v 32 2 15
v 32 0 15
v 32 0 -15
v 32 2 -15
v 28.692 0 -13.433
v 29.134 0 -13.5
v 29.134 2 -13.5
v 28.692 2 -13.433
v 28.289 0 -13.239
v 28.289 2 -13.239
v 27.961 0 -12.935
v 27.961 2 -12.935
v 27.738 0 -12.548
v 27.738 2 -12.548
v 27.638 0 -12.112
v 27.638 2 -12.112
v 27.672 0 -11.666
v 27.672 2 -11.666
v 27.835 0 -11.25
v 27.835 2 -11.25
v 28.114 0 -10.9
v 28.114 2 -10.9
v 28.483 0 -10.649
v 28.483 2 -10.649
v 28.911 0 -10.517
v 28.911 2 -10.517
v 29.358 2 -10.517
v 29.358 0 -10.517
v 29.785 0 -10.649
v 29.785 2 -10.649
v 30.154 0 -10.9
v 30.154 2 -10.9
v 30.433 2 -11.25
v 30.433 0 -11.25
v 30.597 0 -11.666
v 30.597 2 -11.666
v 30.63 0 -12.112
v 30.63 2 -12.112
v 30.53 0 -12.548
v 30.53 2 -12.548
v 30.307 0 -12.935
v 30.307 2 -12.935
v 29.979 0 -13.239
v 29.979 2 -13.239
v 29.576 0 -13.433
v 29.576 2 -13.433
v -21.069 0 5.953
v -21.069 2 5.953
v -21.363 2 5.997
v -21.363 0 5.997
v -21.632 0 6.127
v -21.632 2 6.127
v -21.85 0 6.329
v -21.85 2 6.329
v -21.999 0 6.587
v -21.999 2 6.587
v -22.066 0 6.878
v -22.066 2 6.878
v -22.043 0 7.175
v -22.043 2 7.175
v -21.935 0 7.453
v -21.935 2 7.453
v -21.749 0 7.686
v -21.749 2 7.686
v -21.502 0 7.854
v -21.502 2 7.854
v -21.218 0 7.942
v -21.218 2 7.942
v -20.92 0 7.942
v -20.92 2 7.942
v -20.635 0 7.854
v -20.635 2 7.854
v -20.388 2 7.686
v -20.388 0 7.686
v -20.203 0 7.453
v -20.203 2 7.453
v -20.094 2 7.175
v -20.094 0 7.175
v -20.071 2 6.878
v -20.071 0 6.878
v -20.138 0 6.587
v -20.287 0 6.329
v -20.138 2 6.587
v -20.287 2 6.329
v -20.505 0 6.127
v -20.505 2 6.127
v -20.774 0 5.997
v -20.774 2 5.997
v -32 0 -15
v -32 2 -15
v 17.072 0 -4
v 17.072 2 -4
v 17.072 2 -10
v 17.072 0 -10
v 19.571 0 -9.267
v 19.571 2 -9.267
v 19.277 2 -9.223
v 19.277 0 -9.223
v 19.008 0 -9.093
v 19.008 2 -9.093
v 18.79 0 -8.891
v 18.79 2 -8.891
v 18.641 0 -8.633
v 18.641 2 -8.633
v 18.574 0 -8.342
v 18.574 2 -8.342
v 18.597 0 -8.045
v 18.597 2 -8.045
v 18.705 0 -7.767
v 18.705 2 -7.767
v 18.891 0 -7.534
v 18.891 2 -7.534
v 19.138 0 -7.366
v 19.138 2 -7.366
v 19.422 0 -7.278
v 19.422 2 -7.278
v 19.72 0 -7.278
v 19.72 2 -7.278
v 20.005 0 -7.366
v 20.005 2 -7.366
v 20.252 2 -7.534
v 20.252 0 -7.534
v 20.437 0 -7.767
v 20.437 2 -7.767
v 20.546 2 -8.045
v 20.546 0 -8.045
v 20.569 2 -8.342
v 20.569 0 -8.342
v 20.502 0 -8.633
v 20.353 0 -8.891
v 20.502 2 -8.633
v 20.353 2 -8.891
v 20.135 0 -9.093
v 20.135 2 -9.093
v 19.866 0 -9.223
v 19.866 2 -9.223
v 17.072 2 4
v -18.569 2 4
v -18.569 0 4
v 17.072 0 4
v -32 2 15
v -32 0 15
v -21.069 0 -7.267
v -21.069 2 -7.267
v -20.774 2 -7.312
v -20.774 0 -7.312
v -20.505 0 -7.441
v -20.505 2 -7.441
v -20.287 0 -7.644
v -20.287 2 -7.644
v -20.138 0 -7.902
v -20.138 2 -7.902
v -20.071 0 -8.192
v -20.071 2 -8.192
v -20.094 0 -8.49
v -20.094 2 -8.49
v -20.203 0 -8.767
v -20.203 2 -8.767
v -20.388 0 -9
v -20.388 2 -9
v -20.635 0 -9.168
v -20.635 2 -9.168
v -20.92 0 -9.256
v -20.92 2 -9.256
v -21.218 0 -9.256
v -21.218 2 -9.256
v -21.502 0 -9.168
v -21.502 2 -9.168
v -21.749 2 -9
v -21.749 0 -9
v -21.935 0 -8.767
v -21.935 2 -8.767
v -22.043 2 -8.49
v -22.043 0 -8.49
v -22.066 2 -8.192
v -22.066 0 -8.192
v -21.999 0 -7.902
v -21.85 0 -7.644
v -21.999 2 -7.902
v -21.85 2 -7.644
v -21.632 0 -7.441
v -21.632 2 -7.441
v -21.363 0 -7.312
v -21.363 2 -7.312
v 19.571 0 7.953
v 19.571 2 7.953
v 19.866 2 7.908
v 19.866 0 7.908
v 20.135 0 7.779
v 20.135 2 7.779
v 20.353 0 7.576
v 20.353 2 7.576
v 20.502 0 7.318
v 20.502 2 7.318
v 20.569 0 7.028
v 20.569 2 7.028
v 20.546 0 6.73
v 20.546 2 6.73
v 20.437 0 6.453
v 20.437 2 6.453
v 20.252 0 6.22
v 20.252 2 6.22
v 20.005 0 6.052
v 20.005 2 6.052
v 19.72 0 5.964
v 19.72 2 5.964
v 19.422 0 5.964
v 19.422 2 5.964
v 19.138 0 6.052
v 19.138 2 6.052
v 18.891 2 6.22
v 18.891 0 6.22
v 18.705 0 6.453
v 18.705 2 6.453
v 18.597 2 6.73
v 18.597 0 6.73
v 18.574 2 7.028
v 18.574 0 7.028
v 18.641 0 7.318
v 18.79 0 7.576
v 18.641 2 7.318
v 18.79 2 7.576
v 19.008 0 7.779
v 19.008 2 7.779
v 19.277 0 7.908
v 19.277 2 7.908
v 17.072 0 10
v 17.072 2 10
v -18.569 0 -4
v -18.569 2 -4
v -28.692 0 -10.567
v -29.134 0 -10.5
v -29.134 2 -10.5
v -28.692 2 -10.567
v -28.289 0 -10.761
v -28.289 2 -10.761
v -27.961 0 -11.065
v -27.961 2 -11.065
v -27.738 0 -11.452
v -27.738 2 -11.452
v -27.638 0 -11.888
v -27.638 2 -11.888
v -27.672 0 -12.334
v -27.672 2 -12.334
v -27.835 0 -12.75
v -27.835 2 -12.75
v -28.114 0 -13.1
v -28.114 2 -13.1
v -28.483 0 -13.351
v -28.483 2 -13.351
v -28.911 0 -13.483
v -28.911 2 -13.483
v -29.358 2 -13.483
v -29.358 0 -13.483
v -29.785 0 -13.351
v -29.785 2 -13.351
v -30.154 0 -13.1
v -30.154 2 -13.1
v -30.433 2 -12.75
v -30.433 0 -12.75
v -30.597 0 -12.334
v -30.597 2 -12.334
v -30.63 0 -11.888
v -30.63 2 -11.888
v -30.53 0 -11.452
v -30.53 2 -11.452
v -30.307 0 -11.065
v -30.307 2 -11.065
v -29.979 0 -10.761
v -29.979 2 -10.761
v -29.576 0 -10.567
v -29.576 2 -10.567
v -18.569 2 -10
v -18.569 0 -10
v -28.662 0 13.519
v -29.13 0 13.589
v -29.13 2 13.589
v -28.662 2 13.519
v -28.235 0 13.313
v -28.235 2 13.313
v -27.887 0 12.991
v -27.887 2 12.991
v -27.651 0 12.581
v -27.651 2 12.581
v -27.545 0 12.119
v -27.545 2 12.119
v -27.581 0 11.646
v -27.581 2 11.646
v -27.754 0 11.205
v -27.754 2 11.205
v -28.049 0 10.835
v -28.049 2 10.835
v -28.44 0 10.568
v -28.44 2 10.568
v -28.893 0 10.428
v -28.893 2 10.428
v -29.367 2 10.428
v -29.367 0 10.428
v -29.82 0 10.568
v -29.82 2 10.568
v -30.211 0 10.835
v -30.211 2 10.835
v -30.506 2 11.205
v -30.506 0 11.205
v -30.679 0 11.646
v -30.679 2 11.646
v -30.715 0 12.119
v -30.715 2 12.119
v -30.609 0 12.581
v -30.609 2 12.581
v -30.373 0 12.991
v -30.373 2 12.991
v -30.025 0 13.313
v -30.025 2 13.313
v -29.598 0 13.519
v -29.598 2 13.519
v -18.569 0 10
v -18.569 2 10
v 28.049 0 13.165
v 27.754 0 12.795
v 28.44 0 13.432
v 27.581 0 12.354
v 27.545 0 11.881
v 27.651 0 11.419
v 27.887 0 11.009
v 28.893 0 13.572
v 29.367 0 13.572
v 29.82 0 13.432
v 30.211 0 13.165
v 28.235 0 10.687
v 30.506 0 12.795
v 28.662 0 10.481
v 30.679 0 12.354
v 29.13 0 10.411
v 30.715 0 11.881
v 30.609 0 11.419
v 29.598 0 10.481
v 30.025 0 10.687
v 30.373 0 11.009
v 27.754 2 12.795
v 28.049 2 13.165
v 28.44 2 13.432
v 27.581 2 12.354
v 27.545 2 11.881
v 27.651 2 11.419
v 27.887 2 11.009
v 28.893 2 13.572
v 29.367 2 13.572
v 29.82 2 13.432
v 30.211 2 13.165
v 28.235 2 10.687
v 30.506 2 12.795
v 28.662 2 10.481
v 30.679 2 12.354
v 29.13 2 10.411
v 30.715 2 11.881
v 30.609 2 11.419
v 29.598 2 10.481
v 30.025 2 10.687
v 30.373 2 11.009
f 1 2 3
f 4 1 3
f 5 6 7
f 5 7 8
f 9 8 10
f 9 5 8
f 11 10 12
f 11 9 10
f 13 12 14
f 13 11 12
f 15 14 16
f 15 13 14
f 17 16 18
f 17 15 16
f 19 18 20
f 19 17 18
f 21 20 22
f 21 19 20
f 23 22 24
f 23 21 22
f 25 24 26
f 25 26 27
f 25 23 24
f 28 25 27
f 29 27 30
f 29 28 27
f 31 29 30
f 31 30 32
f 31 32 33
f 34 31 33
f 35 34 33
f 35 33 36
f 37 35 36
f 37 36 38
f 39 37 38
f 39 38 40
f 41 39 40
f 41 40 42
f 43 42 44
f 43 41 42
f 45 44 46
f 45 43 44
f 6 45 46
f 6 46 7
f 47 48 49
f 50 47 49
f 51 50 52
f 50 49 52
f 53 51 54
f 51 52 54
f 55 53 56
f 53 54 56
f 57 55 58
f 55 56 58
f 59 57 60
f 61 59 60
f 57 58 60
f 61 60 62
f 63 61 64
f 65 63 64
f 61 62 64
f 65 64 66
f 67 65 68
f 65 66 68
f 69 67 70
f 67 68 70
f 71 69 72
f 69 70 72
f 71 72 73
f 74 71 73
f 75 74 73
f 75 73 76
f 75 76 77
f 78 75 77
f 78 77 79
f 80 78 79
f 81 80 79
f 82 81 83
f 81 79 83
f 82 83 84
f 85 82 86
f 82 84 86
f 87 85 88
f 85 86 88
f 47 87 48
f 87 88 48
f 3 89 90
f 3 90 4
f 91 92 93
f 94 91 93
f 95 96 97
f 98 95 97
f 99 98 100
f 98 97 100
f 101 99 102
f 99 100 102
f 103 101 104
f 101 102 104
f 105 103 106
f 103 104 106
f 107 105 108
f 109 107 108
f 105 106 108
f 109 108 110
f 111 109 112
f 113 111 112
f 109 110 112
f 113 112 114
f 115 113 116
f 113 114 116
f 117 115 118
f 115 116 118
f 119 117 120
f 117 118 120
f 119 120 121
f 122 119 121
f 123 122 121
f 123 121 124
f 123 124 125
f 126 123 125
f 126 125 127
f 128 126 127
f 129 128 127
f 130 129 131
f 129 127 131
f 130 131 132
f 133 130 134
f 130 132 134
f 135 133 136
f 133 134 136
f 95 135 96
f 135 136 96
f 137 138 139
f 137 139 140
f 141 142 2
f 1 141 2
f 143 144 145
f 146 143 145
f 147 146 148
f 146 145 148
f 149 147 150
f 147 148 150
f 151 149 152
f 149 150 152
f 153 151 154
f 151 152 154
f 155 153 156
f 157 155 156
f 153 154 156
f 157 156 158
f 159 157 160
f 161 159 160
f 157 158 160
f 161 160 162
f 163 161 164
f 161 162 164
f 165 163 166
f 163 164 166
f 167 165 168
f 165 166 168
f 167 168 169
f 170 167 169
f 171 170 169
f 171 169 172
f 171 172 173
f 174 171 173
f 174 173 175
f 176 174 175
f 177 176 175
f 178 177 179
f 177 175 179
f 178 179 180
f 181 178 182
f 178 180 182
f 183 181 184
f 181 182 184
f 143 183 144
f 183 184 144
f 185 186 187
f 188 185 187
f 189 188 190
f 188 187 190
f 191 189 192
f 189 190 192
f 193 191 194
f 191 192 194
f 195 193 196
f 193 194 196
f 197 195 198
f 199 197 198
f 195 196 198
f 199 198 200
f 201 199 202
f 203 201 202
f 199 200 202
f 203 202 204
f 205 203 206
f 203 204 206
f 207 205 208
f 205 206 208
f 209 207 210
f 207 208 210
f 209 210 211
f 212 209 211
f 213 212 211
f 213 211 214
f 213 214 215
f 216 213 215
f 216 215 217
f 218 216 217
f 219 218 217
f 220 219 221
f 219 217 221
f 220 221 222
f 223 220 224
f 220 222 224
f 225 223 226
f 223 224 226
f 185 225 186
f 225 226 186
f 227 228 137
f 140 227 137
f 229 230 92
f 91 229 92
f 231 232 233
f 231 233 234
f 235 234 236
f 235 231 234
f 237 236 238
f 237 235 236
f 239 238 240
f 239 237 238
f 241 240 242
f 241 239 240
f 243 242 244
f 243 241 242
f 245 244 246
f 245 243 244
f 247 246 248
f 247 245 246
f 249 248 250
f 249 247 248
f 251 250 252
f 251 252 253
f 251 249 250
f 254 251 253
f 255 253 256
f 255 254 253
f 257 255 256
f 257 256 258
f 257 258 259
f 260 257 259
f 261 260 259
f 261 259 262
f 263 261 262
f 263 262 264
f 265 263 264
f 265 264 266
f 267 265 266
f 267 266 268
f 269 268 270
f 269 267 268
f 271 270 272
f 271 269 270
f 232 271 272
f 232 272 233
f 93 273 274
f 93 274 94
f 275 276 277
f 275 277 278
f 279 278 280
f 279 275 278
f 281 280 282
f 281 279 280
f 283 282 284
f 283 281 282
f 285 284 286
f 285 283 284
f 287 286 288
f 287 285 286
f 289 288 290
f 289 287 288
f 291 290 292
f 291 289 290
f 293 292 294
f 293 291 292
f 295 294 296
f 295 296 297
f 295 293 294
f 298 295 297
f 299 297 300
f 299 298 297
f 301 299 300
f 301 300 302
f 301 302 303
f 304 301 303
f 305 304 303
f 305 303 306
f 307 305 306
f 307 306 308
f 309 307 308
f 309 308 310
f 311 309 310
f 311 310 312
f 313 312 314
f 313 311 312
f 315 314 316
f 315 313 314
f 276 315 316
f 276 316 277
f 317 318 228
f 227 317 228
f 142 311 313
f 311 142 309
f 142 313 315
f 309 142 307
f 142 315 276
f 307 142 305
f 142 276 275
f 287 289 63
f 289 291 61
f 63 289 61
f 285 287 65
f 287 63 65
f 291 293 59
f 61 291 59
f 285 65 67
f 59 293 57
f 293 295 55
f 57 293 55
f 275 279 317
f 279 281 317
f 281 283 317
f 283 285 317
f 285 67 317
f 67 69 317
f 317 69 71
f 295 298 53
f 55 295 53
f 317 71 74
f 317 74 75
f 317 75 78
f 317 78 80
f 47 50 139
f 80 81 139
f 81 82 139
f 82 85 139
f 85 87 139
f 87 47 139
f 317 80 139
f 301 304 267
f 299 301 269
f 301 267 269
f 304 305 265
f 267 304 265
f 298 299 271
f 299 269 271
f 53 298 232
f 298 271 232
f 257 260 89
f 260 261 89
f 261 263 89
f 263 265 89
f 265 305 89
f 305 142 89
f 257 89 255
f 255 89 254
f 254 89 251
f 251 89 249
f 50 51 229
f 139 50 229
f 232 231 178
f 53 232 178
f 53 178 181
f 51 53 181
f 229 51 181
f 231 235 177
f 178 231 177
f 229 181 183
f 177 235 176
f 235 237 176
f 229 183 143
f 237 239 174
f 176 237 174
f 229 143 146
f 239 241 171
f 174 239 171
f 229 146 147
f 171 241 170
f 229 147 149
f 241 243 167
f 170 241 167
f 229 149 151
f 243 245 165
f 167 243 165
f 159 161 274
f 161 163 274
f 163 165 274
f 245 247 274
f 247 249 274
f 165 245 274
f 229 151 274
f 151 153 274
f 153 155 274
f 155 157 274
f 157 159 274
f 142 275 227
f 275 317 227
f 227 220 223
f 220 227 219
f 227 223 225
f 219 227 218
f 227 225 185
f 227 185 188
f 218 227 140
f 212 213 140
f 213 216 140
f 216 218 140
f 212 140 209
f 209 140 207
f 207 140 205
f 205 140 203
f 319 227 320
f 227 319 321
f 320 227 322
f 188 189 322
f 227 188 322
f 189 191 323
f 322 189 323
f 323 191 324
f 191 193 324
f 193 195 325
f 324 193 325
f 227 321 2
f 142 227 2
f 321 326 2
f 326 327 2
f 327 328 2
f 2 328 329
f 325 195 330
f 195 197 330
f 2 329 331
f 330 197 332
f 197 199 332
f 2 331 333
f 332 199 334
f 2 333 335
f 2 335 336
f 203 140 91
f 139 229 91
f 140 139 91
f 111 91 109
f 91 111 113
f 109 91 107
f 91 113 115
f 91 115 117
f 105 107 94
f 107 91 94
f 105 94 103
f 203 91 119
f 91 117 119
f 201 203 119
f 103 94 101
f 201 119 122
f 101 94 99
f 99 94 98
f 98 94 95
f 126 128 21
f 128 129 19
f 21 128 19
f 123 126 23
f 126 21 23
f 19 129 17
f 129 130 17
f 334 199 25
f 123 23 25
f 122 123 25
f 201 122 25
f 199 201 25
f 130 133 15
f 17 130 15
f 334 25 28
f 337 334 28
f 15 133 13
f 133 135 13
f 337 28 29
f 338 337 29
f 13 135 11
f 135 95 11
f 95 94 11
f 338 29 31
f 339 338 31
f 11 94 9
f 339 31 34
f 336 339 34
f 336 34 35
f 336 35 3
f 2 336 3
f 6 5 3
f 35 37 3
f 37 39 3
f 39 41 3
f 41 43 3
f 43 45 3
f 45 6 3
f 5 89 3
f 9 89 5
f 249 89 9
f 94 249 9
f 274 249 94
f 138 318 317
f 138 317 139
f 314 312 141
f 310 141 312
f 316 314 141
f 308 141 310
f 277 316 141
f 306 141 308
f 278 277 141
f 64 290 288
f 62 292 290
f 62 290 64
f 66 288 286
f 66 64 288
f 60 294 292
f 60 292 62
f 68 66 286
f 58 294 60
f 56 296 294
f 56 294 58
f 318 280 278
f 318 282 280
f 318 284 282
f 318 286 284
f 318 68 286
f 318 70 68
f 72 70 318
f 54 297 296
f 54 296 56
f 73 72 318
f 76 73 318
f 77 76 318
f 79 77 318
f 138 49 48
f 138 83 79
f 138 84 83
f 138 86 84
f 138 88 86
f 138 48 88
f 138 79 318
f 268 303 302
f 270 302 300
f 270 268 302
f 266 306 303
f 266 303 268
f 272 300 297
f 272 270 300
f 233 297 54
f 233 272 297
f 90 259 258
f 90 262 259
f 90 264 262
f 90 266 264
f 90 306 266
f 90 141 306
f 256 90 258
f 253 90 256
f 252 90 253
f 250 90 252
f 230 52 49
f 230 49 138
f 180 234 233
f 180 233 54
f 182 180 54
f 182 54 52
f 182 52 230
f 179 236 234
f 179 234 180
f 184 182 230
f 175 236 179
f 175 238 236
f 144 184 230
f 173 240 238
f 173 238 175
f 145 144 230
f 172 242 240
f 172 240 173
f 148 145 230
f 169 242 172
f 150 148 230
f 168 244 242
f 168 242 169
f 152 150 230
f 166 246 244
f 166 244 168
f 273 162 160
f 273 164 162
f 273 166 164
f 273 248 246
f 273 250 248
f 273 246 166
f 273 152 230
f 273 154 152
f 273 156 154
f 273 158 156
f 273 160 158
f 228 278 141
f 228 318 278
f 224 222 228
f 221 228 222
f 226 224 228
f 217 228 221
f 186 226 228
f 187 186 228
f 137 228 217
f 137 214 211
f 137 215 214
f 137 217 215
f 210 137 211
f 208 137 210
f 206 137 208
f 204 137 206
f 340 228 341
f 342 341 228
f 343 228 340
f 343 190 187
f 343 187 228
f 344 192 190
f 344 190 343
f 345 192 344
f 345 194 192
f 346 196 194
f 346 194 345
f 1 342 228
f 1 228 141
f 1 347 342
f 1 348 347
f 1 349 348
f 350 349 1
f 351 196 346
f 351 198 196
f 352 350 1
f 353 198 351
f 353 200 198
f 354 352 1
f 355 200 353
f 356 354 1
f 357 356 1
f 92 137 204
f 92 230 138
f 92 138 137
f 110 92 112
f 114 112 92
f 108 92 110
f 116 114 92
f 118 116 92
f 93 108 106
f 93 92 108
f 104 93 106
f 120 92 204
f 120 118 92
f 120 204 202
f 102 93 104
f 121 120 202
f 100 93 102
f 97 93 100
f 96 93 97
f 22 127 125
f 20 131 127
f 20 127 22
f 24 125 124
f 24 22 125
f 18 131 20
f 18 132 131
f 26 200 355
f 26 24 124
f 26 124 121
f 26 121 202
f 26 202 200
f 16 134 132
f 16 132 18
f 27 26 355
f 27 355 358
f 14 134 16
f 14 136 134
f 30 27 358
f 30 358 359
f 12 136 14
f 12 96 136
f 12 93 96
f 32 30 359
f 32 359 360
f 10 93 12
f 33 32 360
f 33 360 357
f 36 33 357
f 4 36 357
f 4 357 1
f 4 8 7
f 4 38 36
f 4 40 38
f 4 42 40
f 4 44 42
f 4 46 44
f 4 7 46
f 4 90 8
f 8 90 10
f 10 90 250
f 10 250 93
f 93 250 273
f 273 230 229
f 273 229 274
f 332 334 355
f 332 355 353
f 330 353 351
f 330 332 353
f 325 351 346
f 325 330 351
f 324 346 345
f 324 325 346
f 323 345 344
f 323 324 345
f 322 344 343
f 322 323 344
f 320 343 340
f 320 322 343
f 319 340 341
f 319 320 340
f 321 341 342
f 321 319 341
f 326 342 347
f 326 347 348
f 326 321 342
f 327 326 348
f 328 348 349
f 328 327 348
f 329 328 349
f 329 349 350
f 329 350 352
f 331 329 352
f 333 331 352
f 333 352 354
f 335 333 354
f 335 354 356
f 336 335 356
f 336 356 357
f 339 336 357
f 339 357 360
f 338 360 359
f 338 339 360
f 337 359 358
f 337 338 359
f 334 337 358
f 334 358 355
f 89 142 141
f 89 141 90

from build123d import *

# Parameters (mm, degrees)
SKETCH2_W           = 64
SKETCH2_H           = 30
SKETCH2_R           = 1.589304783
SKETCH2_R_2         = 1.5
BOSS_EXTRUDE1_DEPTH = 2
SKETCH3_R           = 1
SKETCH3_W           = 35.640445049
SKETCH3_H           = 6
CUT_EXTRUDE1_DEPTH  = 2


with BuildPart() as part:
    # Sketch2 → Boss-Extrude1 (new body)
    with BuildSketch(Plane(origin=(0, 0, 0), x_dir=(1, 0, 0), z_dir=(0, 1, 0))):
        Rectangle(SKETCH2_W, SKETCH2_H)
        with Locations(Location((-29.13, -12, 0), (0, 0, 270))):
            Circle(SKETCH2_R, mode=Mode.SUBTRACT)
        with Locations(Location((-29.134119409, 12, 0), (0, 0, 270))):
            Circle(SKETCH2_R_2, mode=Mode.SUBTRACT)
        with Locations(Location((29.13, -12, 0), (0, 0, 90))):
            Circle(SKETCH2_R, mode=Mode.SUBTRACT)
        with Locations(Location((29.134119409, 12, 0), (0, 0, 90))):
            Circle(SKETCH2_R_2, mode=Mode.SUBTRACT)
    extrude(amount=BOSS_EXTRUDE1_DEPTH)

    # Sketch3 → Cut-Extrude1 (cut)
    with BuildSketch(Plane(origin=(0, 2, 0), x_dir=(1, 0, 0), z_dir=(0, 1, 0))):
        with Locations(Location((-21.068550994, 8.267170413, 0), (0, 0, 270))):
            Circle(SKETCH3_R)
        with Locations(Location((19.571449006, 8.267170413, 0), (0, 0, 90))):
            Circle(SKETCH3_R)
        with Locations(Location((19.571449006, -6.952829587, 0), (0, 0, 270))):
            Circle(SKETCH3_R)
        with Locations(Location((-21.068550994, -6.952829587, 0), (0, 0, 90))):
            Circle(SKETCH3_R)
        with Locations((-0.74832847, -7)):
            Rectangle(SKETCH3_W, SKETCH3_H)
        with Locations((-0.74832847, 7)):
            Rectangle(SKETCH3_W, SKETCH3_H)
    extrude(amount=-CUT_EXTRUDE1_DEPTH, mode=Mode.SUBTRACT)


solid = part.part
